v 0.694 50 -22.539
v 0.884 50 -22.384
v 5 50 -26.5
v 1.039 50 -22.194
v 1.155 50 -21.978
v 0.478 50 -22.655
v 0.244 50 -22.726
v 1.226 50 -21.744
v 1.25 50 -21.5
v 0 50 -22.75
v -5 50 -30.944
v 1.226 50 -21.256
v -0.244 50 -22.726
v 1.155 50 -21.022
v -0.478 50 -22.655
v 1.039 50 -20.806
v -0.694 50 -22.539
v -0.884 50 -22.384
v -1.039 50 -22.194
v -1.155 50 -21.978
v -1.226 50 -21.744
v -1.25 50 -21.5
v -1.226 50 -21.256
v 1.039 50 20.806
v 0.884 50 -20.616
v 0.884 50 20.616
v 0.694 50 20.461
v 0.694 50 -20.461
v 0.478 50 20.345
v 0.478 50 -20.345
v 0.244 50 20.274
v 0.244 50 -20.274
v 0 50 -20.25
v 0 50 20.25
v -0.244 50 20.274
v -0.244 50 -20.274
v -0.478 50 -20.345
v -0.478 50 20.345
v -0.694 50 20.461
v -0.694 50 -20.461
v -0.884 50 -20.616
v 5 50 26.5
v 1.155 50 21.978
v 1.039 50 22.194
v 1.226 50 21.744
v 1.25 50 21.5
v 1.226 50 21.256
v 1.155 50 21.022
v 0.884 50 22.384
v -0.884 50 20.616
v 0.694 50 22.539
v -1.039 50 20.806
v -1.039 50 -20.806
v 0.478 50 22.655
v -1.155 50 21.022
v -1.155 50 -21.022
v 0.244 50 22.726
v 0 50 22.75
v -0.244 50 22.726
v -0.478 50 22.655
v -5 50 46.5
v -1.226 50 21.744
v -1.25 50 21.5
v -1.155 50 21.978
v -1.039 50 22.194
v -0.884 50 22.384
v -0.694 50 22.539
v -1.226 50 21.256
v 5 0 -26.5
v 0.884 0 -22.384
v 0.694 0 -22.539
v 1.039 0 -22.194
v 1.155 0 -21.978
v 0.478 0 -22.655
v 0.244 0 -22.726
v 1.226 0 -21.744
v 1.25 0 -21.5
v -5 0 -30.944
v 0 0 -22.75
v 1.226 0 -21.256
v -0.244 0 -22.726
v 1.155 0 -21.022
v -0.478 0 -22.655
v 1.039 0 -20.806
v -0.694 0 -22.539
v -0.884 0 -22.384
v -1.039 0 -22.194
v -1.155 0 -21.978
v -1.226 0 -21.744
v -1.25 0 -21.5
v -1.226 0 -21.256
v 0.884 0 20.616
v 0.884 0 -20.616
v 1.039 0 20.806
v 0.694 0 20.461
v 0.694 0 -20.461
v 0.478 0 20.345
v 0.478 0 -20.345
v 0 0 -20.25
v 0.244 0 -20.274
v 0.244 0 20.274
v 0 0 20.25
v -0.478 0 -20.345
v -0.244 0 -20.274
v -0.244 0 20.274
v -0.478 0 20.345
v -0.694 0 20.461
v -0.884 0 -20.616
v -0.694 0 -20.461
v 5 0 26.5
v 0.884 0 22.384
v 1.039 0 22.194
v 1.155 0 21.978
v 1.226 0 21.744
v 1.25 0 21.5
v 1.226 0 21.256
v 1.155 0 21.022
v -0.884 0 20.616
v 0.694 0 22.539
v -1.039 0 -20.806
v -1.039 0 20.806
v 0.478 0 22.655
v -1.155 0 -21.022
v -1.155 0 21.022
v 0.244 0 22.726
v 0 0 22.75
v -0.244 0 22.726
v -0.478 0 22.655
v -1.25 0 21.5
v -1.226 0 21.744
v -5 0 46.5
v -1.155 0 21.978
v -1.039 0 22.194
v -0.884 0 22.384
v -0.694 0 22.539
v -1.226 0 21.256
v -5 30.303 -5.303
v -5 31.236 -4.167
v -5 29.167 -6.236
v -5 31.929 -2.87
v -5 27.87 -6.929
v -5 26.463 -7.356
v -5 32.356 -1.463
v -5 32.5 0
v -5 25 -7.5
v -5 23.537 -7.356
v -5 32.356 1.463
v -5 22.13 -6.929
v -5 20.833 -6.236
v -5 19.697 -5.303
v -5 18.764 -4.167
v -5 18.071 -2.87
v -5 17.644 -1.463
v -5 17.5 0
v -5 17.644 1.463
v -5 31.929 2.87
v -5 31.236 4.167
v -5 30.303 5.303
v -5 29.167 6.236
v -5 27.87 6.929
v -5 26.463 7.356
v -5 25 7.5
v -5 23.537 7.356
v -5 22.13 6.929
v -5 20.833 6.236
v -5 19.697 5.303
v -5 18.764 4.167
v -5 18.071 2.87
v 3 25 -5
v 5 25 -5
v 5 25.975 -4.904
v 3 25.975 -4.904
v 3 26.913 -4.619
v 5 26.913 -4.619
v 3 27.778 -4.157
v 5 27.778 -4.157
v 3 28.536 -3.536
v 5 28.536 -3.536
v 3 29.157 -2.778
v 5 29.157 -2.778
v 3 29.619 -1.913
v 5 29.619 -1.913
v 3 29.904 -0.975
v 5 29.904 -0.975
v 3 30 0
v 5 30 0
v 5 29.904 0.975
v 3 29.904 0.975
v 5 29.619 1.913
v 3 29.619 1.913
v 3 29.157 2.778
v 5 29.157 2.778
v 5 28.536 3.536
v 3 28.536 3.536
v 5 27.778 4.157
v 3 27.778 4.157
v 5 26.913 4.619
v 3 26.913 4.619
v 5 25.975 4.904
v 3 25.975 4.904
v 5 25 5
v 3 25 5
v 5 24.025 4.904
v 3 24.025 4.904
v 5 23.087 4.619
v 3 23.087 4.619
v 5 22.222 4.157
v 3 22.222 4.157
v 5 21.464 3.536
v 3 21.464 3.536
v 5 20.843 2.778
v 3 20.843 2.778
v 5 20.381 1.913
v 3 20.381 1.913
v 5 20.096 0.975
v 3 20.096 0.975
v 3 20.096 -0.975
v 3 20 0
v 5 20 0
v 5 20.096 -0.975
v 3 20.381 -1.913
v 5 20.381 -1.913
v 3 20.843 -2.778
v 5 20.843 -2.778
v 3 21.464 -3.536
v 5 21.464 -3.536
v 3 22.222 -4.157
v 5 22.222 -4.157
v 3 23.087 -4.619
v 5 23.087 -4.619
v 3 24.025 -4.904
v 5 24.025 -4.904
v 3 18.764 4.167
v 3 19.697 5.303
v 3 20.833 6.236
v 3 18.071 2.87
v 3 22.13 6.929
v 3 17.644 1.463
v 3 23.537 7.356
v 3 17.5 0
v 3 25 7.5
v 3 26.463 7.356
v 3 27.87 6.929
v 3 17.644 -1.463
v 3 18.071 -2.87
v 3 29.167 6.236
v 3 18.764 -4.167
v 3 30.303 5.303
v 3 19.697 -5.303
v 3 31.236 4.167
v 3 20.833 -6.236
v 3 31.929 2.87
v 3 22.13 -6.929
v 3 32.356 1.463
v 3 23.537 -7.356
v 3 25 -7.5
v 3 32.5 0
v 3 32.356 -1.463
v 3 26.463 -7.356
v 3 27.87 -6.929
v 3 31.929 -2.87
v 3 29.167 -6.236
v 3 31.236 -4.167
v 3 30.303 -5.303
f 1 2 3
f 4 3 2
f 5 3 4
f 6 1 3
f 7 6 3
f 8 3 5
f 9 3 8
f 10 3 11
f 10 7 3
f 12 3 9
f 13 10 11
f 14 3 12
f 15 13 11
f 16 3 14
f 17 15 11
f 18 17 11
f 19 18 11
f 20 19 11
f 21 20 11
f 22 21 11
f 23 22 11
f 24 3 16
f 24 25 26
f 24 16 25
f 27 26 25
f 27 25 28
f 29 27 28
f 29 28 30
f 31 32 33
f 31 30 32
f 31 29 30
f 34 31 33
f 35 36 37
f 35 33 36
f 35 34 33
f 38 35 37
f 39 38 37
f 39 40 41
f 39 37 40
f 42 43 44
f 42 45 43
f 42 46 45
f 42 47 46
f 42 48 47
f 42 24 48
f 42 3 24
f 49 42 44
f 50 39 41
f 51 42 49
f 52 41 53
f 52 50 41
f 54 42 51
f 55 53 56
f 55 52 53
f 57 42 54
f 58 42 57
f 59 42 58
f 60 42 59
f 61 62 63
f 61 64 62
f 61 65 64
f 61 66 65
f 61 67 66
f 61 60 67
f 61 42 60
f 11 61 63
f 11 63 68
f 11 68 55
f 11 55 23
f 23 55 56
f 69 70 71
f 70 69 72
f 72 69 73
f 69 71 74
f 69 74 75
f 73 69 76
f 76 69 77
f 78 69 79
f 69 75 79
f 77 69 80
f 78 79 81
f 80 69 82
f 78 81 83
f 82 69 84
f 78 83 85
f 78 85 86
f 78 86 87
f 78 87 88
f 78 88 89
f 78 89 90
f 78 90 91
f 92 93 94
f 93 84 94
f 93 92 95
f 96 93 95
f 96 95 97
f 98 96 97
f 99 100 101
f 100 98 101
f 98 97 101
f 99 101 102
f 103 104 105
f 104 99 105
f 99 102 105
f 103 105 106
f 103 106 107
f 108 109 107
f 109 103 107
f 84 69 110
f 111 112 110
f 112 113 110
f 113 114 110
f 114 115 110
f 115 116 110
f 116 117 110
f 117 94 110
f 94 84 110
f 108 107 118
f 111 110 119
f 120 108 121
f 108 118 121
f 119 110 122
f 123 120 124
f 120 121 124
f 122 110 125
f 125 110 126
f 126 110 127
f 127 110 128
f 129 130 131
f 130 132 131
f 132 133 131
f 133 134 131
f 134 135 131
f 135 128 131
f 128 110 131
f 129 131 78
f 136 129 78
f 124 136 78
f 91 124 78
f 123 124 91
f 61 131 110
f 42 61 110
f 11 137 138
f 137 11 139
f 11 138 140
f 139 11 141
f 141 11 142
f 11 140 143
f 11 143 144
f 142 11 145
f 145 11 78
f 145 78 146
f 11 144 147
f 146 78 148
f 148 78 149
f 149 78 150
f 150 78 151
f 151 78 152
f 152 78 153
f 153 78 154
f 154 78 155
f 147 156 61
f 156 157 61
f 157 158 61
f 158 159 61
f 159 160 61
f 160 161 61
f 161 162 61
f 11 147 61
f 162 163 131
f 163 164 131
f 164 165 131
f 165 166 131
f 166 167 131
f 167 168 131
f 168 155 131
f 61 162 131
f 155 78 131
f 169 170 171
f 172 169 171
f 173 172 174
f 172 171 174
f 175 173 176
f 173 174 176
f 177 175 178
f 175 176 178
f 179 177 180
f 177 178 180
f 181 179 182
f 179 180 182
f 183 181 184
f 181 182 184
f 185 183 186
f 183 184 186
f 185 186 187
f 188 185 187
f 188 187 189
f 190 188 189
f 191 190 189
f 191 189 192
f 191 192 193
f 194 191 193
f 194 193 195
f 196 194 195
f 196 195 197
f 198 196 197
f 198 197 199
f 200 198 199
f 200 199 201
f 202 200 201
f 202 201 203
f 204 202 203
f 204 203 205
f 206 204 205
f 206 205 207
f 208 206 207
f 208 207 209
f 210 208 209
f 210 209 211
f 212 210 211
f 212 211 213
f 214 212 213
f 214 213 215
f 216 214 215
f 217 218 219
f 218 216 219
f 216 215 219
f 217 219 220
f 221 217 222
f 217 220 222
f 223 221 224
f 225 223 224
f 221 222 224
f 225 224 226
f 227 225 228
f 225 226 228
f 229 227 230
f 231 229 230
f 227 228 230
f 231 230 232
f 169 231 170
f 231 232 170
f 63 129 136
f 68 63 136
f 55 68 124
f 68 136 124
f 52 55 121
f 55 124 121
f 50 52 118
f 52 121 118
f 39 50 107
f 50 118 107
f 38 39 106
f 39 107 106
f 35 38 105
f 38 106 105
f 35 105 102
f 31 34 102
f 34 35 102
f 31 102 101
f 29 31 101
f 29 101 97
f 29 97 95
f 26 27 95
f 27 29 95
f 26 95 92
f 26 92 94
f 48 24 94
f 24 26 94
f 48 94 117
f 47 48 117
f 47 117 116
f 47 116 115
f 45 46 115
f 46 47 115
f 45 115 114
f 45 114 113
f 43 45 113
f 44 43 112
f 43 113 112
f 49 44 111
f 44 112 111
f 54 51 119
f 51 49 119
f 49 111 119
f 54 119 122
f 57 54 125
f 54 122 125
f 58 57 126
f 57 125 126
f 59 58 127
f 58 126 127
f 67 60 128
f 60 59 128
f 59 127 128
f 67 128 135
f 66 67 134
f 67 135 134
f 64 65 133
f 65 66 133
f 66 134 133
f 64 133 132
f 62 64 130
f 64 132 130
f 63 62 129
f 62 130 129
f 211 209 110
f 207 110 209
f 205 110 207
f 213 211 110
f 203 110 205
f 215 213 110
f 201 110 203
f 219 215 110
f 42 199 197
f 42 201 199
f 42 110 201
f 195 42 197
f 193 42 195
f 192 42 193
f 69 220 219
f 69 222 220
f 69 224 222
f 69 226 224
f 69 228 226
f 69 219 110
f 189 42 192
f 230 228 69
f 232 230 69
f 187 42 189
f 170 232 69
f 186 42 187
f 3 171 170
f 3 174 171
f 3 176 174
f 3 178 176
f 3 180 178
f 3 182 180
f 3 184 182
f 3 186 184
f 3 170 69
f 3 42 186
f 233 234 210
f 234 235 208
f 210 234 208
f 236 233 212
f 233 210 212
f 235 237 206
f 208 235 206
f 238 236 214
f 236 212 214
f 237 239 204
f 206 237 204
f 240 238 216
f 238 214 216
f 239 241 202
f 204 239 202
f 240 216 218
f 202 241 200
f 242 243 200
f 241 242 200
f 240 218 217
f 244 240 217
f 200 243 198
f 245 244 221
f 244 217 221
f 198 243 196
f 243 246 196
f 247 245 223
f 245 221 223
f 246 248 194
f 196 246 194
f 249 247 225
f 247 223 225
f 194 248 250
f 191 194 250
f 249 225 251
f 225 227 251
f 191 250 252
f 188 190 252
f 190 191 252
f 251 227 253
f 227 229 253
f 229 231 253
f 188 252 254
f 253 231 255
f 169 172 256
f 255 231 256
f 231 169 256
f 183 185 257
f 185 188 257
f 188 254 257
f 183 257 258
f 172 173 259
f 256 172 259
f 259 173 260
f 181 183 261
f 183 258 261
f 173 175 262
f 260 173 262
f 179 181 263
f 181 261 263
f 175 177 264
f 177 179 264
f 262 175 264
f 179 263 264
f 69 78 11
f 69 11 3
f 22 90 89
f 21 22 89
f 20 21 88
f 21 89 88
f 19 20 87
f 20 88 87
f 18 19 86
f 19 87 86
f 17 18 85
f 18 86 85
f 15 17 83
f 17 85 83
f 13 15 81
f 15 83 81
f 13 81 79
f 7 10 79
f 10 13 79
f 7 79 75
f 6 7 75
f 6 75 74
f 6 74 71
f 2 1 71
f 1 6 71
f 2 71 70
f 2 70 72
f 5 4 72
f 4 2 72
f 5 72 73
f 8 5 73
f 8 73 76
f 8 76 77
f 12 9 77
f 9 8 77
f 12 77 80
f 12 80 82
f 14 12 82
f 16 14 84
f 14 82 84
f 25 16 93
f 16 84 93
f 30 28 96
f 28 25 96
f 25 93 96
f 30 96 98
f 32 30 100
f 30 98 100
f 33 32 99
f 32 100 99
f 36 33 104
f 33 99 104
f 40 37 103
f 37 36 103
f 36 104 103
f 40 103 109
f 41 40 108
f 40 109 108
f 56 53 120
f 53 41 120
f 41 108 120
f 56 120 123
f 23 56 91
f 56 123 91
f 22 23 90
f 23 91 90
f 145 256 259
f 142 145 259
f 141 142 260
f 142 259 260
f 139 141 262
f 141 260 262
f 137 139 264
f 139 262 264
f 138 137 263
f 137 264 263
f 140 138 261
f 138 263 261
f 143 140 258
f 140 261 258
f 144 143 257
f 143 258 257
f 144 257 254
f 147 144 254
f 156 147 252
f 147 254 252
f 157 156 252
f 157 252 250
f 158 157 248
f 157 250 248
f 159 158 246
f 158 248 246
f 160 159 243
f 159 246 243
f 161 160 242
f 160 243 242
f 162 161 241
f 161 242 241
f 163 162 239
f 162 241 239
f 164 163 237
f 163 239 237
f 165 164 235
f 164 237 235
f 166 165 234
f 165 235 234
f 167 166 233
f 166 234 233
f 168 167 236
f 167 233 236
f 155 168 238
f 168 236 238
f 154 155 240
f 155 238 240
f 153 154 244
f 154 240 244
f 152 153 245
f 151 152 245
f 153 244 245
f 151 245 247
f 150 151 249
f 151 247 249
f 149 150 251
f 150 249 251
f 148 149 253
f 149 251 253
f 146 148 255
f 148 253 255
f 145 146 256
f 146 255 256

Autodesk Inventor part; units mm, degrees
ref_plane "YZ Plane" through (0, 0, 0) normal (1, 0, 0) x (0, 1, 0)
ref_plane "XZ Plane" through (0, 0, 0) normal (0, 1, 0) x (-1, 0, 0)
ref_plane "XY Plane" through (0, 0, 0) normal (0, 0, 1) x (1, 0, 0)
sketch "Sketch1" plane through (0, 0, 0) normal (0, 1, 0) x (-1, 0, 0)
  line L0 (-5, 26.5) -> (5, 26.5)
  line L1 (5, 26.5) -> (5, -26.5)
  line L2 (5, -26.5) -> (-5, -26.5)
  line L3 (-5, -26.5) -> (-5, 26.5)
  line L4 (5, -26.5) -> (5, -30.9444)
  line L5 (5, -30.9444) -> (-5, -26.5)
  line L6 (5, -30.9444) -> (5, 46.5)
  line L7 (5, 46.5) -> (-5, 26.5)
  line L8 (-5, -26.5) -> (0, -26.5)
  line L9 (-5, -21.5) -> (-5, -26.5)
  line L10 (5, 26.5) -> (0, 26.5)
  line L11 (5, 21.5) -> (5, 26.5)
  circle A0 centre (0, 21.5) radius 1.25
  circle A1 centre (0, -21.5) radius 1.25
  point P0 (0, 0)
  dimension "d0" = 10
  dimension "d1" = 53
  dimension "d2" = 4.4444
  dimension "d3" = 77.4444
  dimension "d8" = 2.5
  dimension "d9" = 2.5
extrude "Extrusion1" add sketch "Sketch1" along normal blind 50
sketch "Sketch2" plane through (5, 0, 26.5) normal (1, 0, 0) x (0, 0, -1)
  line L0 (53, 0) -> (0, 0)
  line L1 (0, 0) -> (0, 50)
  line L2 (0, 50) -> (53, 50)
  line L3 (53, 50) -> (53, 0)
  line L4 (26.5, 0) -> (26.5, 25)
  circle A0 centre (26.5, 25) radius 7.5
  circle A1 centre (26.5, 25) radius 5
  dimension "d12" = 25
  dimension "d13" = 15
  dimension "d16" = 10
extrude "Extrusion2" cut sketch "Sketch2" against normal blind 10 contours A1 | A0
extrude "Extrusion3" add sketch "Sketch2" against normal blind 2 contours A0
properties part number "bocnice_kratsi"
